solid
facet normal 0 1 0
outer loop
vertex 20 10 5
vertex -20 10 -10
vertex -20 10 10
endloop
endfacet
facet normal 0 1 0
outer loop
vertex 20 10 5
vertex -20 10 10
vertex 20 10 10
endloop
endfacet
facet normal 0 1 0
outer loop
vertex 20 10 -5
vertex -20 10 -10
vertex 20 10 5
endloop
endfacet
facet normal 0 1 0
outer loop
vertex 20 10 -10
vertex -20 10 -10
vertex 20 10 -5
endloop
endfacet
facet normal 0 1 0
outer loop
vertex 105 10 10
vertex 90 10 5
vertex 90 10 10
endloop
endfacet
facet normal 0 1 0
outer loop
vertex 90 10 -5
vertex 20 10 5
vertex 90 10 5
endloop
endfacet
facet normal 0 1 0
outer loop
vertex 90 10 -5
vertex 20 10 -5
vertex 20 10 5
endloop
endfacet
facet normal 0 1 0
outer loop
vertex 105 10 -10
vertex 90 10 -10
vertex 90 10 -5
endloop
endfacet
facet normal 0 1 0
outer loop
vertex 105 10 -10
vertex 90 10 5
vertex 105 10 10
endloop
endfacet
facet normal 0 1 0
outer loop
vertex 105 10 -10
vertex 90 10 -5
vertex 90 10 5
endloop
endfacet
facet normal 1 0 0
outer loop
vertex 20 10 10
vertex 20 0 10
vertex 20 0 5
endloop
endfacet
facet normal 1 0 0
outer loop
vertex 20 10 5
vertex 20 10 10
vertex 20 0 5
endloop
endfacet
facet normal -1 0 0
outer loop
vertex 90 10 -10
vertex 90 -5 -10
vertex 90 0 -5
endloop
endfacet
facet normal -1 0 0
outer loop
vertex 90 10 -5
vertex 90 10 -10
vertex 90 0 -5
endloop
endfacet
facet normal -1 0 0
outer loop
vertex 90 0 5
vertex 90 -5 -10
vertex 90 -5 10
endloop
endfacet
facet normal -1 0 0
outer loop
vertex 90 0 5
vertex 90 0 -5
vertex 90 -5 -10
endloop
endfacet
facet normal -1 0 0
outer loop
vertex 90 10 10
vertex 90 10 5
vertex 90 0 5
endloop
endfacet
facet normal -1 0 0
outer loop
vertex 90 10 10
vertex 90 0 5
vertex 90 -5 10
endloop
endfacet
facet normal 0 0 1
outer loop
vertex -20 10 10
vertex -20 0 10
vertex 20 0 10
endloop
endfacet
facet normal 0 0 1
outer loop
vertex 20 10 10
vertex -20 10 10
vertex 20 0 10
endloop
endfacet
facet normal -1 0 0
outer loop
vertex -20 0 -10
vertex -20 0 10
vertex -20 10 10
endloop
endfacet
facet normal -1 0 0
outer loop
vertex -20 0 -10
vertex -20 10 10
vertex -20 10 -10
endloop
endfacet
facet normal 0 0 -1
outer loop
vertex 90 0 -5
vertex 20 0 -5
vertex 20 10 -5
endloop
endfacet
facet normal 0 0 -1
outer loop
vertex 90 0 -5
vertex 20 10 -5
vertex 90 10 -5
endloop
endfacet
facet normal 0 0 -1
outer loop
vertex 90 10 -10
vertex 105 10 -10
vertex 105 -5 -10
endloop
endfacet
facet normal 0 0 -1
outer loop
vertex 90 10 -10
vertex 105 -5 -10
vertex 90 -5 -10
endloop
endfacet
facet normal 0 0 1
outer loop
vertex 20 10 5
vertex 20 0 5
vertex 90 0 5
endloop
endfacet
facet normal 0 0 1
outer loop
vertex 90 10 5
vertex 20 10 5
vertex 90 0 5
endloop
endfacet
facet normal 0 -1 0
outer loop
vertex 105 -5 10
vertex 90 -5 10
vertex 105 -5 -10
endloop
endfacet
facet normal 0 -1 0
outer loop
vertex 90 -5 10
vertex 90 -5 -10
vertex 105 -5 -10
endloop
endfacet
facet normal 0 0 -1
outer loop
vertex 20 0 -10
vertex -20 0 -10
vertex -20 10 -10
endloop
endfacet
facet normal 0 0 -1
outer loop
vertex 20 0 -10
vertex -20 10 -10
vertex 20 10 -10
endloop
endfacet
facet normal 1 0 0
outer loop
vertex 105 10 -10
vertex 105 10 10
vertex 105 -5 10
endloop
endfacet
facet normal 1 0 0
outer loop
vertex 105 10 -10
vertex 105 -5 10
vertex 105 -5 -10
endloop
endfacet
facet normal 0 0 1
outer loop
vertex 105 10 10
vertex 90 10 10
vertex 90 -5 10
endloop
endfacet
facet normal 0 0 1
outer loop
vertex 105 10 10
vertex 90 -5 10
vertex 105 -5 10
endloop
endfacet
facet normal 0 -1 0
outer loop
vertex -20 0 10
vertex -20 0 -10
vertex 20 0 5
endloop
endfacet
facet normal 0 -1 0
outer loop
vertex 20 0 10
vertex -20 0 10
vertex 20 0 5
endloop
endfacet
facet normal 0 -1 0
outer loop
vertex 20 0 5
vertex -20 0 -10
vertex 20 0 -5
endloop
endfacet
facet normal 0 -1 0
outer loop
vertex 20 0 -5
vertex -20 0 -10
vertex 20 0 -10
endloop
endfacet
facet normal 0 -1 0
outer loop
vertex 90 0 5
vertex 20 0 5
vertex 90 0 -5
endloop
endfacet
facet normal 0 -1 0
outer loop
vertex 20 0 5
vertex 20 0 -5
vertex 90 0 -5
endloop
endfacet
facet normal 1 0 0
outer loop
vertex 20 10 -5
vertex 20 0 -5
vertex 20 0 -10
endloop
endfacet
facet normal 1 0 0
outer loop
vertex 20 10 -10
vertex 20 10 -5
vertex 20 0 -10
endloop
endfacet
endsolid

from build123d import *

# Parameters (mm, degrees)
SKETCH1_W           = 70
SKETCH1_H           = 10
SKETCH1_W_2         = 40
SKETCH1_H_2         = 20
BOSS_EXTRUDE1_DEPTH = 10
BOSS_EXTRUDE2_START = 10
BOSS_EXTRUDE2_DEPTH = 15


with BuildPart() as part:
    # Sketch1 → Boss-Extrude1 (new body)
    with BuildSketch(Plane(origin=(0, 0, 0), x_dir=(1, 0, 0), z_dir=(0, 1, 0))):
        with Locations((55, 0)):
            Rectangle(SKETCH1_W, SKETCH1_H)
        Rectangle(SKETCH1_W_2, SKETCH1_H_2)
    extrude(amount=BOSS_EXTRUDE1_DEPTH)

    # Sketch1<3> → Boss-Extrude2 (add)
    with BuildSketch(Plane(origin=(0, 0, 0), x_dir=(1, 0, 0), z_dir=(0, 1, 0)).offset(BOSS_EXTRUDE2_START)):
        Polygon((90, 5), (90, -5), (90, -10), (105, -10), (105, 10), (90, 10), align=None)
    extrude(amount=-BOSS_EXTRUDE2_DEPTH)


solid = part.part
